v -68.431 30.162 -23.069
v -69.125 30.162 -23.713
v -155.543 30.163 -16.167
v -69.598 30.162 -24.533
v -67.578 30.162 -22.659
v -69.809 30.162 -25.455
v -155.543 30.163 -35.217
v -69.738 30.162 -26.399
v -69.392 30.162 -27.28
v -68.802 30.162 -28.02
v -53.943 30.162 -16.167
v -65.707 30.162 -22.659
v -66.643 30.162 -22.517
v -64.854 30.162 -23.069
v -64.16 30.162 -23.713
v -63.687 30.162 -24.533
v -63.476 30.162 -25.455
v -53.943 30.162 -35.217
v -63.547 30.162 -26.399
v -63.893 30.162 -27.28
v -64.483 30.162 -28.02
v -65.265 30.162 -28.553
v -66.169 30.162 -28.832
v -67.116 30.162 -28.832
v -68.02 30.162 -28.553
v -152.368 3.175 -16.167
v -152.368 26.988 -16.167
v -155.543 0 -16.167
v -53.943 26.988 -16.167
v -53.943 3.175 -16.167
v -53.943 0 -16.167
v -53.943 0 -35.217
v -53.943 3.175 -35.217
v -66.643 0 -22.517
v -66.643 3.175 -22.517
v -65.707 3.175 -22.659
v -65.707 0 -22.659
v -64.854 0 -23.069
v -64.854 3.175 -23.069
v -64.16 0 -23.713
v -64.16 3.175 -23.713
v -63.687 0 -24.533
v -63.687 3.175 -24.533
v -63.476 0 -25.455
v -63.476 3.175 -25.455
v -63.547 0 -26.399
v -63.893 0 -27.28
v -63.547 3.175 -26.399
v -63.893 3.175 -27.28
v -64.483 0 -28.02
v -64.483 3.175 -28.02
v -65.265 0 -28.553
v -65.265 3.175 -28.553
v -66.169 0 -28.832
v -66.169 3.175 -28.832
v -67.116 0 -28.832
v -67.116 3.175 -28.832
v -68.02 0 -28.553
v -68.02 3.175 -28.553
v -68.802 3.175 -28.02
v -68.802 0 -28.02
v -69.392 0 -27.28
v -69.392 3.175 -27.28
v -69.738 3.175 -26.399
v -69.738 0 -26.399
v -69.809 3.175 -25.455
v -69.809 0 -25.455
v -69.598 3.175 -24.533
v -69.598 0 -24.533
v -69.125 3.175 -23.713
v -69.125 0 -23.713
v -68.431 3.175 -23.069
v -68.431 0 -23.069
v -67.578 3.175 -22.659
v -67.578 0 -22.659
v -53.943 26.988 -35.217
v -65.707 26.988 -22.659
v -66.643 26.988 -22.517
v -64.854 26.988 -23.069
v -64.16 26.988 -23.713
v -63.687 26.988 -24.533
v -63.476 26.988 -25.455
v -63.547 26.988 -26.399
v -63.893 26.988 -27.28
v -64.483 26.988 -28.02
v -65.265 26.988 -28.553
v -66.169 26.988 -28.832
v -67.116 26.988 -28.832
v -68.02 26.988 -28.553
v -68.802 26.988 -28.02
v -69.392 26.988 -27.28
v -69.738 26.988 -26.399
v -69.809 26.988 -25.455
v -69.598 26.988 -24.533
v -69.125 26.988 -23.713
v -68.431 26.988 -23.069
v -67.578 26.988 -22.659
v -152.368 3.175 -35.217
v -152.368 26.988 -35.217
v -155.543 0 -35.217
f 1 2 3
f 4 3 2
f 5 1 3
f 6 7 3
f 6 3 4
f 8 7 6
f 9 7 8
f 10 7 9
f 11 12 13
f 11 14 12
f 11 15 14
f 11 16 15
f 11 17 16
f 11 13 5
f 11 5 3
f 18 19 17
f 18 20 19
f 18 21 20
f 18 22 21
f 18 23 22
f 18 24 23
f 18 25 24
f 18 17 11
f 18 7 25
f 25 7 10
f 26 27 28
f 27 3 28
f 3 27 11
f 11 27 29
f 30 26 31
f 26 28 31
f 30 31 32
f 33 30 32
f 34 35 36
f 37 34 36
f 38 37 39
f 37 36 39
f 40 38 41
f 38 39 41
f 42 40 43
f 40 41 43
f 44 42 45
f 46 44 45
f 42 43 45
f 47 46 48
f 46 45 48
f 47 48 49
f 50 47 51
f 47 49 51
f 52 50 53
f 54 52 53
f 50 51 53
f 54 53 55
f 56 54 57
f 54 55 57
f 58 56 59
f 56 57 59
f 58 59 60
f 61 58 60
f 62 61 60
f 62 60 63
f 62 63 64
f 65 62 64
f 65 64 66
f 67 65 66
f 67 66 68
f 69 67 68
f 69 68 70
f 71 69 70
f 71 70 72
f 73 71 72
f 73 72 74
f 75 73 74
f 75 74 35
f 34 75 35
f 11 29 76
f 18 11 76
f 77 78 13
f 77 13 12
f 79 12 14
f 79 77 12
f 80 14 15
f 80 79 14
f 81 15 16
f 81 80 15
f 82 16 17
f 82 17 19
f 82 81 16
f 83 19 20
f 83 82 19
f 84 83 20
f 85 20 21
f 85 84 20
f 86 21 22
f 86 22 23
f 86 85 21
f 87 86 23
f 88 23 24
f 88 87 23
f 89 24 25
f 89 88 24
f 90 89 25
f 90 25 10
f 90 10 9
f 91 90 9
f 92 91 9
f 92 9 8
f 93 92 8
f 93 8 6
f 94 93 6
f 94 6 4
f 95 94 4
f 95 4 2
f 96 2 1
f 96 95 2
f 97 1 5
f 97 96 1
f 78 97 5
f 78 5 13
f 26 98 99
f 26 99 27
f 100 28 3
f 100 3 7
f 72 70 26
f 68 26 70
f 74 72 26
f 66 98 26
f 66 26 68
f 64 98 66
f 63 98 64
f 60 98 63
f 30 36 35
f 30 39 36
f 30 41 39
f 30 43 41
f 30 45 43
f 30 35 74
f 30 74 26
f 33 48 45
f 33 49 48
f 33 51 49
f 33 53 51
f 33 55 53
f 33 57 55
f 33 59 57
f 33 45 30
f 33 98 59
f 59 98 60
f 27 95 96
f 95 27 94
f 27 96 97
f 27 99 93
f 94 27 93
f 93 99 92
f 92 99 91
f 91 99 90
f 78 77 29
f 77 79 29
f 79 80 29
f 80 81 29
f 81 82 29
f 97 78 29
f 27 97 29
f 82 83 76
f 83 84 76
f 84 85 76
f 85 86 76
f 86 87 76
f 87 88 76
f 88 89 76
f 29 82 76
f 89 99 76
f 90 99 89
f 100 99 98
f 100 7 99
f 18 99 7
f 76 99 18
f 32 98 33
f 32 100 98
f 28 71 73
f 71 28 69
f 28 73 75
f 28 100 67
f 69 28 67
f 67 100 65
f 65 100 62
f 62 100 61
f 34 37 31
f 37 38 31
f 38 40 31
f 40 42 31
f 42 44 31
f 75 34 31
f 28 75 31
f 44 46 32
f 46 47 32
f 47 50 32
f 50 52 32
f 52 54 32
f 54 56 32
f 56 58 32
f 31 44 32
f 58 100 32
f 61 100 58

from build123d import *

# Parameters (mm, degrees)
SKETCH1_W           = 101.6
SKETCH1_H           = 19.05
BOSS_EXTRUDE1_DEPTH = 3.175
SKETCH5_R           = 3.175
CUT_EXTRUDE2_DEPTH  = 160.51127542
SKETCH6_W           = 101.6
SKETCH6_H           = 19.05
SKETCH6_R           = 3.175
BOSS_EXTRUDE2_DEPTH = 3.175
SKETCH9_W           = 19.05
SKETCH9_H           = 30.1625
BOSS_EXTRUDE5_DEPTH = 3.175


with BuildPart() as part:
    # Sketch1 → Boss-Extrude1 (new body)
    with BuildSketch(Plane(origin=(0, 0, 0), x_dir=(1, 0, 0), z_dir=(0, 1, 0))):
        with Locations((-104.742582317, 25.692487805)):
            Rectangle(SKETCH1_W, SKETCH1_H)
    extrude(amount=BOSS_EXTRUDE1_DEPTH)

    # Sketch5 → Cut-Extrude2 (cut, through all)
    with BuildSketch(Plane(origin=(0, 3.175, 0), x_dir=(1, 0, 0), z_dir=(0, 1, 0))):
        with Locations(Location((-66.642582317, 25.692487805, 0), (0, 0, 270))):
            Circle(SKETCH5_R)
    extrude(amount=-CUT_EXTRUDE2_DEPTH, mode=Mode.SUBTRACT)



with BuildPart() as body_2:
    # Sketch6 → Boss-Extrude2 (new body)
    with BuildSketch(Plane(origin=(0, 26.9875, 0), x_dir=(1, 0, 0), z_dir=(0, 1, 0))):
        with Locations((-104.742582317, 25.692487805)):
            Rectangle(SKETCH6_W, SKETCH6_H)
        with Locations(Location((-66.642582317, 25.692487805, 0), (0, 0, 270))):
            Circle(SKETCH6_R, mode=Mode.SUBTRACT)
    extrude(amount=BOSS_EXTRUDE2_DEPTH)


with BuildPart() as part_1:
    add(part.part)

    add(body_2.part)  # Boss-Extrude5 merges body 2
    # Sketch9 → Boss-Extrude5 (add)
    with BuildSketch(Plane.ZY.offset(155.542582317)):
        with Locations((-25.692487805, 15.08125)):
            Rectangle(SKETCH9_W, SKETCH9_H)
    extrude(amount=-BOSS_EXTRUDE5_DEPTH)


solid = part_1.part
